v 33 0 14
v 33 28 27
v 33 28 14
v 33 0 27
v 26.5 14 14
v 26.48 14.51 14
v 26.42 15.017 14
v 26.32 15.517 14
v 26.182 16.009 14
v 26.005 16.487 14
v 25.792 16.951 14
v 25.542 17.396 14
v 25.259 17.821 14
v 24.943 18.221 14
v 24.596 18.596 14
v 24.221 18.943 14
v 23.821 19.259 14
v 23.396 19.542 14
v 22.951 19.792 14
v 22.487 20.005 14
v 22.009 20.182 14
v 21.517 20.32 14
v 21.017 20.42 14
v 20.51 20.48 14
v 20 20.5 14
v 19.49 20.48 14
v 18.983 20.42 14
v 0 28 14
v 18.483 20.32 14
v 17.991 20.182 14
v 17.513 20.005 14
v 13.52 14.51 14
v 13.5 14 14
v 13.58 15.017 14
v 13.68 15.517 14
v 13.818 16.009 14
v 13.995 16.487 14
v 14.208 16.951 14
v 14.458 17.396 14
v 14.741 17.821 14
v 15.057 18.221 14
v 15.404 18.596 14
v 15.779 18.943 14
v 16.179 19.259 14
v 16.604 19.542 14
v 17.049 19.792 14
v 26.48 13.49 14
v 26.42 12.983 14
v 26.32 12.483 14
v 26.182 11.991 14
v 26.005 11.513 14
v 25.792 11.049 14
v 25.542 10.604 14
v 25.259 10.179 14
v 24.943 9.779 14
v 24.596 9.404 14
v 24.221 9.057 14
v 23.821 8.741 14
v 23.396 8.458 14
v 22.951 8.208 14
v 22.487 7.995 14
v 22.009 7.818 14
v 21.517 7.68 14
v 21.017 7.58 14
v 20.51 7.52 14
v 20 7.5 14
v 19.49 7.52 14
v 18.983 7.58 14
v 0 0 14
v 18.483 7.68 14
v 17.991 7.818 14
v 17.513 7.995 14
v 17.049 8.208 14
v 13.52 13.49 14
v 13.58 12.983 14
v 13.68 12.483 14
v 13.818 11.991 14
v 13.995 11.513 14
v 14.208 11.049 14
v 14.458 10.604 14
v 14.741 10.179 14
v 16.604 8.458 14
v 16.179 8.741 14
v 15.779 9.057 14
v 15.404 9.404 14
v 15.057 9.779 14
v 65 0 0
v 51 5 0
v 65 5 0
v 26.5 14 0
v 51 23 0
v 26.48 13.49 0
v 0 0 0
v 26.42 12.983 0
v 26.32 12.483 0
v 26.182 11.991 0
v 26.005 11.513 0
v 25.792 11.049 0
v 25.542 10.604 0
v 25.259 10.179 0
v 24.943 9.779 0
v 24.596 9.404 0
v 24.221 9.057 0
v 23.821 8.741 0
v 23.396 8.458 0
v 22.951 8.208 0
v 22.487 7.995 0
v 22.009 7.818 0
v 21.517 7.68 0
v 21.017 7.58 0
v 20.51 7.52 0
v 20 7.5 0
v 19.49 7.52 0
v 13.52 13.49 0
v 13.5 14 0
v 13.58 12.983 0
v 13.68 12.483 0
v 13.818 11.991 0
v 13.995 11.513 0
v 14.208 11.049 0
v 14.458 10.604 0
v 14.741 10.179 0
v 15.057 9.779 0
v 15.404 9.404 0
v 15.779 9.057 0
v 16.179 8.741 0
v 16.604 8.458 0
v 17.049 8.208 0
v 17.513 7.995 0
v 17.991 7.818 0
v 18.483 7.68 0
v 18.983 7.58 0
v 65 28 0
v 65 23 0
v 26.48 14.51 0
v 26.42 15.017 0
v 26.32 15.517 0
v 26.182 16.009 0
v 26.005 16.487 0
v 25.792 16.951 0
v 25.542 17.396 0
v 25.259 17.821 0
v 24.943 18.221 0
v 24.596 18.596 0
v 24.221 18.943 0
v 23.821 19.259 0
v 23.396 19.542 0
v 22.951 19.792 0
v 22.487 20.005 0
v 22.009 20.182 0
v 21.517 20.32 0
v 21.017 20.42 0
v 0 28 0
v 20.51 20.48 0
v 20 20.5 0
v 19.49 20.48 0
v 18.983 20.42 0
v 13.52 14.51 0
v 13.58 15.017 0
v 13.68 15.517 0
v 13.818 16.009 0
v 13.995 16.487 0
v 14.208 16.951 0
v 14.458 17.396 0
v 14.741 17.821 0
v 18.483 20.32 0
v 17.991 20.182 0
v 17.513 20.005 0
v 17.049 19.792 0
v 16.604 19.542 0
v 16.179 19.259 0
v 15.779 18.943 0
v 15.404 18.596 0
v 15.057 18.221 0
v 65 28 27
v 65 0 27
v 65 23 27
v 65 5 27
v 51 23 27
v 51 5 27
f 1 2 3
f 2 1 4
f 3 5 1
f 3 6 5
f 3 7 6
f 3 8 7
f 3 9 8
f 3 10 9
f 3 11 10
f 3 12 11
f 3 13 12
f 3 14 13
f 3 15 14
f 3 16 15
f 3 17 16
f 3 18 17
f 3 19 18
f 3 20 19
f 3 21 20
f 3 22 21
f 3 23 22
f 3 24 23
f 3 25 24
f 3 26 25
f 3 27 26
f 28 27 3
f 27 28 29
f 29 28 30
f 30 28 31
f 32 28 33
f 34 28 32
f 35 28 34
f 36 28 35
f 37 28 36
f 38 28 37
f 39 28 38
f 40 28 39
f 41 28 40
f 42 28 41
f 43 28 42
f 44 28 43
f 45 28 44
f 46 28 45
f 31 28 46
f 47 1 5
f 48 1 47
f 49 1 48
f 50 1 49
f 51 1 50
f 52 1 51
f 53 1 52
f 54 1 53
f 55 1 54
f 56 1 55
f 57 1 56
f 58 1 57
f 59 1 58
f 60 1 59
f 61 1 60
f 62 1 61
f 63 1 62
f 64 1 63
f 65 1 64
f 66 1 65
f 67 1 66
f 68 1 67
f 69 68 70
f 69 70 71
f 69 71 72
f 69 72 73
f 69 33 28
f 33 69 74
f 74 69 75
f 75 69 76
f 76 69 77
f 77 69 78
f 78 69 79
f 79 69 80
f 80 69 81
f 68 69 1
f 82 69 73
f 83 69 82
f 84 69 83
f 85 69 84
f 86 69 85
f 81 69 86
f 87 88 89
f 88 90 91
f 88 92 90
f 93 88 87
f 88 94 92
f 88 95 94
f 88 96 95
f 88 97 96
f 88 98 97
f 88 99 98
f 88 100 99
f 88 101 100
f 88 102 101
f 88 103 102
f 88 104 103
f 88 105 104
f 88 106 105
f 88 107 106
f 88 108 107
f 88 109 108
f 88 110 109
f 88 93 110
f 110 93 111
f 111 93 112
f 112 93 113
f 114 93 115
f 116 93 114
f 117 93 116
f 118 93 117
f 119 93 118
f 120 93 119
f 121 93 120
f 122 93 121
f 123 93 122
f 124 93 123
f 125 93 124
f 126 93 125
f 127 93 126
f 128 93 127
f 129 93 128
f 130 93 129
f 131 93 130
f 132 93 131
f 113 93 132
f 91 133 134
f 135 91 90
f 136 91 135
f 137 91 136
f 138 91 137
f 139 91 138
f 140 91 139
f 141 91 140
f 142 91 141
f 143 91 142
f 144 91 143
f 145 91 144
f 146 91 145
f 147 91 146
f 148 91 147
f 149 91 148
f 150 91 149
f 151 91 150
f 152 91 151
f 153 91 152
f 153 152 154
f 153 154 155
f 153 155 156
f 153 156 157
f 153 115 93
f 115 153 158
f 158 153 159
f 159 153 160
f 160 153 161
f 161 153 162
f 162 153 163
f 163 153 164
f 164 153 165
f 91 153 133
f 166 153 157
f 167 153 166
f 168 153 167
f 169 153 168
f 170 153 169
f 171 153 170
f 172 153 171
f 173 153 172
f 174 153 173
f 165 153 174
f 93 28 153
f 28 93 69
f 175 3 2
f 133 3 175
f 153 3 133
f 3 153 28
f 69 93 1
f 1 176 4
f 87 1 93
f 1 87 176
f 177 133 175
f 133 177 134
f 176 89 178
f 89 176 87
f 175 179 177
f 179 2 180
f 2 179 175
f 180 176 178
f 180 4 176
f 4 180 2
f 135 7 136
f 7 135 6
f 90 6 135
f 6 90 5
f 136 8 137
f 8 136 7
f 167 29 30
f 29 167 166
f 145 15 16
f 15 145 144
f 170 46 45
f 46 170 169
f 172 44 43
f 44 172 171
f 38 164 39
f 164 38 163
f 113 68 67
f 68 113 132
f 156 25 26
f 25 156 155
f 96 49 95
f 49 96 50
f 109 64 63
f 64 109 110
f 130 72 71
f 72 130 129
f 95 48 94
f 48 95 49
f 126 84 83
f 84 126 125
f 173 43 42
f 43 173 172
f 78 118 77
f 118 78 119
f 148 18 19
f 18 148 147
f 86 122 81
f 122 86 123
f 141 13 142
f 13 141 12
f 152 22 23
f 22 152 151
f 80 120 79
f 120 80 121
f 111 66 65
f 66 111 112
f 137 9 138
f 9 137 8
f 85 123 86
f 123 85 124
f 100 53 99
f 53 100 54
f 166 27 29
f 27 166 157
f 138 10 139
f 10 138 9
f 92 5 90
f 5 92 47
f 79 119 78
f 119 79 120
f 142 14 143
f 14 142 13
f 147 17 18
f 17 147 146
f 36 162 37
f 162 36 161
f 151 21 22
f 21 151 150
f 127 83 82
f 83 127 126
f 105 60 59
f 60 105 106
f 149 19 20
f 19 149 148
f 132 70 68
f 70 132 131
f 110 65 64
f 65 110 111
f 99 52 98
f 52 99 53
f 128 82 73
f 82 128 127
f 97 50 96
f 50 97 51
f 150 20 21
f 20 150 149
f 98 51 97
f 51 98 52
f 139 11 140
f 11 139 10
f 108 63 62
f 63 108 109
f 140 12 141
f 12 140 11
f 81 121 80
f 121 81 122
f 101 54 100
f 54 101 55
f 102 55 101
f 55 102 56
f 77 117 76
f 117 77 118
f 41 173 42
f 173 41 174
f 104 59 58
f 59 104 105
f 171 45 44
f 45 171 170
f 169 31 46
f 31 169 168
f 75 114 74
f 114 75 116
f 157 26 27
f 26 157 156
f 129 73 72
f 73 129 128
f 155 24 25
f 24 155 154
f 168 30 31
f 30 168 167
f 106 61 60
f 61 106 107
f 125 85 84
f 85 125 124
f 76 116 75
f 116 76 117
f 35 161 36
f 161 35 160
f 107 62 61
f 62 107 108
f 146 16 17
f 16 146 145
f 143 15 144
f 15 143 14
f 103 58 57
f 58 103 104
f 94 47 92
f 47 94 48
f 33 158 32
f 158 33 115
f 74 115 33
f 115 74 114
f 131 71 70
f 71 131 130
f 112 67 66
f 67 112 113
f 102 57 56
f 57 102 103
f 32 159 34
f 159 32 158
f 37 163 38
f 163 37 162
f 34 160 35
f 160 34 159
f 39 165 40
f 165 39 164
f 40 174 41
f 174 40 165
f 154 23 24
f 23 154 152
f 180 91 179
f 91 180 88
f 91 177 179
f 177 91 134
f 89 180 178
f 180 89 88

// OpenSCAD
// Mô hình 3D từ bản vẽ hình chiếu kỹ thuật
// Kích thước chuẩn theo bản vẽ:
// - Tổng chiều dài (X): 65 mm
// - Tổng chiều rộng (Y): 28 mm
// - Tổng chiều cao (Z): 27 mm

$fn = 80; // Độ mịn đường cong tròn

module chi_tiet_co_khi() {
    difference() {
        // 1. Khối phôi bậc thang cơ sở
        union() {
            // Bậc thấp (bên trái): dài 33, rộng 28, cao 14
            cube([33, 28, 14]);
            
            // Bậc cao (bên phải): dài 32, rộng 28, cao 27
            translate([33, 0, 0])
                cube([32, 28, 27]);
        }
        
        // 2. Lỗ tròn xuyên suốt phi 13 ở bậc thấp
        // Tâm lỗ cách mép trái 20mm, nằm chính giữa bề rộng (y = 14mm)
        translate([20, 14, -1])
            cylinder(d = 13, h = 16);
            
        // 3. Rãnh chữ U ở bậc cao
        // Chiều sâu rãnh: 14mm (từ mép phải x = 65 lùi vào x = 51)
        // Chiều rộng rãnh: 18mm (nằm đối xứng ở giữa, y từ 5 đến 23)
        // Chiều cao: xuyên suốt toàn bộ chiều cao (z từ -1 đến 29)
        translate([65 - 14, (28 - 18) / 2, -1])
            cube([15, 18, 29]);
    }
}

chi_tiet_co_khi();
